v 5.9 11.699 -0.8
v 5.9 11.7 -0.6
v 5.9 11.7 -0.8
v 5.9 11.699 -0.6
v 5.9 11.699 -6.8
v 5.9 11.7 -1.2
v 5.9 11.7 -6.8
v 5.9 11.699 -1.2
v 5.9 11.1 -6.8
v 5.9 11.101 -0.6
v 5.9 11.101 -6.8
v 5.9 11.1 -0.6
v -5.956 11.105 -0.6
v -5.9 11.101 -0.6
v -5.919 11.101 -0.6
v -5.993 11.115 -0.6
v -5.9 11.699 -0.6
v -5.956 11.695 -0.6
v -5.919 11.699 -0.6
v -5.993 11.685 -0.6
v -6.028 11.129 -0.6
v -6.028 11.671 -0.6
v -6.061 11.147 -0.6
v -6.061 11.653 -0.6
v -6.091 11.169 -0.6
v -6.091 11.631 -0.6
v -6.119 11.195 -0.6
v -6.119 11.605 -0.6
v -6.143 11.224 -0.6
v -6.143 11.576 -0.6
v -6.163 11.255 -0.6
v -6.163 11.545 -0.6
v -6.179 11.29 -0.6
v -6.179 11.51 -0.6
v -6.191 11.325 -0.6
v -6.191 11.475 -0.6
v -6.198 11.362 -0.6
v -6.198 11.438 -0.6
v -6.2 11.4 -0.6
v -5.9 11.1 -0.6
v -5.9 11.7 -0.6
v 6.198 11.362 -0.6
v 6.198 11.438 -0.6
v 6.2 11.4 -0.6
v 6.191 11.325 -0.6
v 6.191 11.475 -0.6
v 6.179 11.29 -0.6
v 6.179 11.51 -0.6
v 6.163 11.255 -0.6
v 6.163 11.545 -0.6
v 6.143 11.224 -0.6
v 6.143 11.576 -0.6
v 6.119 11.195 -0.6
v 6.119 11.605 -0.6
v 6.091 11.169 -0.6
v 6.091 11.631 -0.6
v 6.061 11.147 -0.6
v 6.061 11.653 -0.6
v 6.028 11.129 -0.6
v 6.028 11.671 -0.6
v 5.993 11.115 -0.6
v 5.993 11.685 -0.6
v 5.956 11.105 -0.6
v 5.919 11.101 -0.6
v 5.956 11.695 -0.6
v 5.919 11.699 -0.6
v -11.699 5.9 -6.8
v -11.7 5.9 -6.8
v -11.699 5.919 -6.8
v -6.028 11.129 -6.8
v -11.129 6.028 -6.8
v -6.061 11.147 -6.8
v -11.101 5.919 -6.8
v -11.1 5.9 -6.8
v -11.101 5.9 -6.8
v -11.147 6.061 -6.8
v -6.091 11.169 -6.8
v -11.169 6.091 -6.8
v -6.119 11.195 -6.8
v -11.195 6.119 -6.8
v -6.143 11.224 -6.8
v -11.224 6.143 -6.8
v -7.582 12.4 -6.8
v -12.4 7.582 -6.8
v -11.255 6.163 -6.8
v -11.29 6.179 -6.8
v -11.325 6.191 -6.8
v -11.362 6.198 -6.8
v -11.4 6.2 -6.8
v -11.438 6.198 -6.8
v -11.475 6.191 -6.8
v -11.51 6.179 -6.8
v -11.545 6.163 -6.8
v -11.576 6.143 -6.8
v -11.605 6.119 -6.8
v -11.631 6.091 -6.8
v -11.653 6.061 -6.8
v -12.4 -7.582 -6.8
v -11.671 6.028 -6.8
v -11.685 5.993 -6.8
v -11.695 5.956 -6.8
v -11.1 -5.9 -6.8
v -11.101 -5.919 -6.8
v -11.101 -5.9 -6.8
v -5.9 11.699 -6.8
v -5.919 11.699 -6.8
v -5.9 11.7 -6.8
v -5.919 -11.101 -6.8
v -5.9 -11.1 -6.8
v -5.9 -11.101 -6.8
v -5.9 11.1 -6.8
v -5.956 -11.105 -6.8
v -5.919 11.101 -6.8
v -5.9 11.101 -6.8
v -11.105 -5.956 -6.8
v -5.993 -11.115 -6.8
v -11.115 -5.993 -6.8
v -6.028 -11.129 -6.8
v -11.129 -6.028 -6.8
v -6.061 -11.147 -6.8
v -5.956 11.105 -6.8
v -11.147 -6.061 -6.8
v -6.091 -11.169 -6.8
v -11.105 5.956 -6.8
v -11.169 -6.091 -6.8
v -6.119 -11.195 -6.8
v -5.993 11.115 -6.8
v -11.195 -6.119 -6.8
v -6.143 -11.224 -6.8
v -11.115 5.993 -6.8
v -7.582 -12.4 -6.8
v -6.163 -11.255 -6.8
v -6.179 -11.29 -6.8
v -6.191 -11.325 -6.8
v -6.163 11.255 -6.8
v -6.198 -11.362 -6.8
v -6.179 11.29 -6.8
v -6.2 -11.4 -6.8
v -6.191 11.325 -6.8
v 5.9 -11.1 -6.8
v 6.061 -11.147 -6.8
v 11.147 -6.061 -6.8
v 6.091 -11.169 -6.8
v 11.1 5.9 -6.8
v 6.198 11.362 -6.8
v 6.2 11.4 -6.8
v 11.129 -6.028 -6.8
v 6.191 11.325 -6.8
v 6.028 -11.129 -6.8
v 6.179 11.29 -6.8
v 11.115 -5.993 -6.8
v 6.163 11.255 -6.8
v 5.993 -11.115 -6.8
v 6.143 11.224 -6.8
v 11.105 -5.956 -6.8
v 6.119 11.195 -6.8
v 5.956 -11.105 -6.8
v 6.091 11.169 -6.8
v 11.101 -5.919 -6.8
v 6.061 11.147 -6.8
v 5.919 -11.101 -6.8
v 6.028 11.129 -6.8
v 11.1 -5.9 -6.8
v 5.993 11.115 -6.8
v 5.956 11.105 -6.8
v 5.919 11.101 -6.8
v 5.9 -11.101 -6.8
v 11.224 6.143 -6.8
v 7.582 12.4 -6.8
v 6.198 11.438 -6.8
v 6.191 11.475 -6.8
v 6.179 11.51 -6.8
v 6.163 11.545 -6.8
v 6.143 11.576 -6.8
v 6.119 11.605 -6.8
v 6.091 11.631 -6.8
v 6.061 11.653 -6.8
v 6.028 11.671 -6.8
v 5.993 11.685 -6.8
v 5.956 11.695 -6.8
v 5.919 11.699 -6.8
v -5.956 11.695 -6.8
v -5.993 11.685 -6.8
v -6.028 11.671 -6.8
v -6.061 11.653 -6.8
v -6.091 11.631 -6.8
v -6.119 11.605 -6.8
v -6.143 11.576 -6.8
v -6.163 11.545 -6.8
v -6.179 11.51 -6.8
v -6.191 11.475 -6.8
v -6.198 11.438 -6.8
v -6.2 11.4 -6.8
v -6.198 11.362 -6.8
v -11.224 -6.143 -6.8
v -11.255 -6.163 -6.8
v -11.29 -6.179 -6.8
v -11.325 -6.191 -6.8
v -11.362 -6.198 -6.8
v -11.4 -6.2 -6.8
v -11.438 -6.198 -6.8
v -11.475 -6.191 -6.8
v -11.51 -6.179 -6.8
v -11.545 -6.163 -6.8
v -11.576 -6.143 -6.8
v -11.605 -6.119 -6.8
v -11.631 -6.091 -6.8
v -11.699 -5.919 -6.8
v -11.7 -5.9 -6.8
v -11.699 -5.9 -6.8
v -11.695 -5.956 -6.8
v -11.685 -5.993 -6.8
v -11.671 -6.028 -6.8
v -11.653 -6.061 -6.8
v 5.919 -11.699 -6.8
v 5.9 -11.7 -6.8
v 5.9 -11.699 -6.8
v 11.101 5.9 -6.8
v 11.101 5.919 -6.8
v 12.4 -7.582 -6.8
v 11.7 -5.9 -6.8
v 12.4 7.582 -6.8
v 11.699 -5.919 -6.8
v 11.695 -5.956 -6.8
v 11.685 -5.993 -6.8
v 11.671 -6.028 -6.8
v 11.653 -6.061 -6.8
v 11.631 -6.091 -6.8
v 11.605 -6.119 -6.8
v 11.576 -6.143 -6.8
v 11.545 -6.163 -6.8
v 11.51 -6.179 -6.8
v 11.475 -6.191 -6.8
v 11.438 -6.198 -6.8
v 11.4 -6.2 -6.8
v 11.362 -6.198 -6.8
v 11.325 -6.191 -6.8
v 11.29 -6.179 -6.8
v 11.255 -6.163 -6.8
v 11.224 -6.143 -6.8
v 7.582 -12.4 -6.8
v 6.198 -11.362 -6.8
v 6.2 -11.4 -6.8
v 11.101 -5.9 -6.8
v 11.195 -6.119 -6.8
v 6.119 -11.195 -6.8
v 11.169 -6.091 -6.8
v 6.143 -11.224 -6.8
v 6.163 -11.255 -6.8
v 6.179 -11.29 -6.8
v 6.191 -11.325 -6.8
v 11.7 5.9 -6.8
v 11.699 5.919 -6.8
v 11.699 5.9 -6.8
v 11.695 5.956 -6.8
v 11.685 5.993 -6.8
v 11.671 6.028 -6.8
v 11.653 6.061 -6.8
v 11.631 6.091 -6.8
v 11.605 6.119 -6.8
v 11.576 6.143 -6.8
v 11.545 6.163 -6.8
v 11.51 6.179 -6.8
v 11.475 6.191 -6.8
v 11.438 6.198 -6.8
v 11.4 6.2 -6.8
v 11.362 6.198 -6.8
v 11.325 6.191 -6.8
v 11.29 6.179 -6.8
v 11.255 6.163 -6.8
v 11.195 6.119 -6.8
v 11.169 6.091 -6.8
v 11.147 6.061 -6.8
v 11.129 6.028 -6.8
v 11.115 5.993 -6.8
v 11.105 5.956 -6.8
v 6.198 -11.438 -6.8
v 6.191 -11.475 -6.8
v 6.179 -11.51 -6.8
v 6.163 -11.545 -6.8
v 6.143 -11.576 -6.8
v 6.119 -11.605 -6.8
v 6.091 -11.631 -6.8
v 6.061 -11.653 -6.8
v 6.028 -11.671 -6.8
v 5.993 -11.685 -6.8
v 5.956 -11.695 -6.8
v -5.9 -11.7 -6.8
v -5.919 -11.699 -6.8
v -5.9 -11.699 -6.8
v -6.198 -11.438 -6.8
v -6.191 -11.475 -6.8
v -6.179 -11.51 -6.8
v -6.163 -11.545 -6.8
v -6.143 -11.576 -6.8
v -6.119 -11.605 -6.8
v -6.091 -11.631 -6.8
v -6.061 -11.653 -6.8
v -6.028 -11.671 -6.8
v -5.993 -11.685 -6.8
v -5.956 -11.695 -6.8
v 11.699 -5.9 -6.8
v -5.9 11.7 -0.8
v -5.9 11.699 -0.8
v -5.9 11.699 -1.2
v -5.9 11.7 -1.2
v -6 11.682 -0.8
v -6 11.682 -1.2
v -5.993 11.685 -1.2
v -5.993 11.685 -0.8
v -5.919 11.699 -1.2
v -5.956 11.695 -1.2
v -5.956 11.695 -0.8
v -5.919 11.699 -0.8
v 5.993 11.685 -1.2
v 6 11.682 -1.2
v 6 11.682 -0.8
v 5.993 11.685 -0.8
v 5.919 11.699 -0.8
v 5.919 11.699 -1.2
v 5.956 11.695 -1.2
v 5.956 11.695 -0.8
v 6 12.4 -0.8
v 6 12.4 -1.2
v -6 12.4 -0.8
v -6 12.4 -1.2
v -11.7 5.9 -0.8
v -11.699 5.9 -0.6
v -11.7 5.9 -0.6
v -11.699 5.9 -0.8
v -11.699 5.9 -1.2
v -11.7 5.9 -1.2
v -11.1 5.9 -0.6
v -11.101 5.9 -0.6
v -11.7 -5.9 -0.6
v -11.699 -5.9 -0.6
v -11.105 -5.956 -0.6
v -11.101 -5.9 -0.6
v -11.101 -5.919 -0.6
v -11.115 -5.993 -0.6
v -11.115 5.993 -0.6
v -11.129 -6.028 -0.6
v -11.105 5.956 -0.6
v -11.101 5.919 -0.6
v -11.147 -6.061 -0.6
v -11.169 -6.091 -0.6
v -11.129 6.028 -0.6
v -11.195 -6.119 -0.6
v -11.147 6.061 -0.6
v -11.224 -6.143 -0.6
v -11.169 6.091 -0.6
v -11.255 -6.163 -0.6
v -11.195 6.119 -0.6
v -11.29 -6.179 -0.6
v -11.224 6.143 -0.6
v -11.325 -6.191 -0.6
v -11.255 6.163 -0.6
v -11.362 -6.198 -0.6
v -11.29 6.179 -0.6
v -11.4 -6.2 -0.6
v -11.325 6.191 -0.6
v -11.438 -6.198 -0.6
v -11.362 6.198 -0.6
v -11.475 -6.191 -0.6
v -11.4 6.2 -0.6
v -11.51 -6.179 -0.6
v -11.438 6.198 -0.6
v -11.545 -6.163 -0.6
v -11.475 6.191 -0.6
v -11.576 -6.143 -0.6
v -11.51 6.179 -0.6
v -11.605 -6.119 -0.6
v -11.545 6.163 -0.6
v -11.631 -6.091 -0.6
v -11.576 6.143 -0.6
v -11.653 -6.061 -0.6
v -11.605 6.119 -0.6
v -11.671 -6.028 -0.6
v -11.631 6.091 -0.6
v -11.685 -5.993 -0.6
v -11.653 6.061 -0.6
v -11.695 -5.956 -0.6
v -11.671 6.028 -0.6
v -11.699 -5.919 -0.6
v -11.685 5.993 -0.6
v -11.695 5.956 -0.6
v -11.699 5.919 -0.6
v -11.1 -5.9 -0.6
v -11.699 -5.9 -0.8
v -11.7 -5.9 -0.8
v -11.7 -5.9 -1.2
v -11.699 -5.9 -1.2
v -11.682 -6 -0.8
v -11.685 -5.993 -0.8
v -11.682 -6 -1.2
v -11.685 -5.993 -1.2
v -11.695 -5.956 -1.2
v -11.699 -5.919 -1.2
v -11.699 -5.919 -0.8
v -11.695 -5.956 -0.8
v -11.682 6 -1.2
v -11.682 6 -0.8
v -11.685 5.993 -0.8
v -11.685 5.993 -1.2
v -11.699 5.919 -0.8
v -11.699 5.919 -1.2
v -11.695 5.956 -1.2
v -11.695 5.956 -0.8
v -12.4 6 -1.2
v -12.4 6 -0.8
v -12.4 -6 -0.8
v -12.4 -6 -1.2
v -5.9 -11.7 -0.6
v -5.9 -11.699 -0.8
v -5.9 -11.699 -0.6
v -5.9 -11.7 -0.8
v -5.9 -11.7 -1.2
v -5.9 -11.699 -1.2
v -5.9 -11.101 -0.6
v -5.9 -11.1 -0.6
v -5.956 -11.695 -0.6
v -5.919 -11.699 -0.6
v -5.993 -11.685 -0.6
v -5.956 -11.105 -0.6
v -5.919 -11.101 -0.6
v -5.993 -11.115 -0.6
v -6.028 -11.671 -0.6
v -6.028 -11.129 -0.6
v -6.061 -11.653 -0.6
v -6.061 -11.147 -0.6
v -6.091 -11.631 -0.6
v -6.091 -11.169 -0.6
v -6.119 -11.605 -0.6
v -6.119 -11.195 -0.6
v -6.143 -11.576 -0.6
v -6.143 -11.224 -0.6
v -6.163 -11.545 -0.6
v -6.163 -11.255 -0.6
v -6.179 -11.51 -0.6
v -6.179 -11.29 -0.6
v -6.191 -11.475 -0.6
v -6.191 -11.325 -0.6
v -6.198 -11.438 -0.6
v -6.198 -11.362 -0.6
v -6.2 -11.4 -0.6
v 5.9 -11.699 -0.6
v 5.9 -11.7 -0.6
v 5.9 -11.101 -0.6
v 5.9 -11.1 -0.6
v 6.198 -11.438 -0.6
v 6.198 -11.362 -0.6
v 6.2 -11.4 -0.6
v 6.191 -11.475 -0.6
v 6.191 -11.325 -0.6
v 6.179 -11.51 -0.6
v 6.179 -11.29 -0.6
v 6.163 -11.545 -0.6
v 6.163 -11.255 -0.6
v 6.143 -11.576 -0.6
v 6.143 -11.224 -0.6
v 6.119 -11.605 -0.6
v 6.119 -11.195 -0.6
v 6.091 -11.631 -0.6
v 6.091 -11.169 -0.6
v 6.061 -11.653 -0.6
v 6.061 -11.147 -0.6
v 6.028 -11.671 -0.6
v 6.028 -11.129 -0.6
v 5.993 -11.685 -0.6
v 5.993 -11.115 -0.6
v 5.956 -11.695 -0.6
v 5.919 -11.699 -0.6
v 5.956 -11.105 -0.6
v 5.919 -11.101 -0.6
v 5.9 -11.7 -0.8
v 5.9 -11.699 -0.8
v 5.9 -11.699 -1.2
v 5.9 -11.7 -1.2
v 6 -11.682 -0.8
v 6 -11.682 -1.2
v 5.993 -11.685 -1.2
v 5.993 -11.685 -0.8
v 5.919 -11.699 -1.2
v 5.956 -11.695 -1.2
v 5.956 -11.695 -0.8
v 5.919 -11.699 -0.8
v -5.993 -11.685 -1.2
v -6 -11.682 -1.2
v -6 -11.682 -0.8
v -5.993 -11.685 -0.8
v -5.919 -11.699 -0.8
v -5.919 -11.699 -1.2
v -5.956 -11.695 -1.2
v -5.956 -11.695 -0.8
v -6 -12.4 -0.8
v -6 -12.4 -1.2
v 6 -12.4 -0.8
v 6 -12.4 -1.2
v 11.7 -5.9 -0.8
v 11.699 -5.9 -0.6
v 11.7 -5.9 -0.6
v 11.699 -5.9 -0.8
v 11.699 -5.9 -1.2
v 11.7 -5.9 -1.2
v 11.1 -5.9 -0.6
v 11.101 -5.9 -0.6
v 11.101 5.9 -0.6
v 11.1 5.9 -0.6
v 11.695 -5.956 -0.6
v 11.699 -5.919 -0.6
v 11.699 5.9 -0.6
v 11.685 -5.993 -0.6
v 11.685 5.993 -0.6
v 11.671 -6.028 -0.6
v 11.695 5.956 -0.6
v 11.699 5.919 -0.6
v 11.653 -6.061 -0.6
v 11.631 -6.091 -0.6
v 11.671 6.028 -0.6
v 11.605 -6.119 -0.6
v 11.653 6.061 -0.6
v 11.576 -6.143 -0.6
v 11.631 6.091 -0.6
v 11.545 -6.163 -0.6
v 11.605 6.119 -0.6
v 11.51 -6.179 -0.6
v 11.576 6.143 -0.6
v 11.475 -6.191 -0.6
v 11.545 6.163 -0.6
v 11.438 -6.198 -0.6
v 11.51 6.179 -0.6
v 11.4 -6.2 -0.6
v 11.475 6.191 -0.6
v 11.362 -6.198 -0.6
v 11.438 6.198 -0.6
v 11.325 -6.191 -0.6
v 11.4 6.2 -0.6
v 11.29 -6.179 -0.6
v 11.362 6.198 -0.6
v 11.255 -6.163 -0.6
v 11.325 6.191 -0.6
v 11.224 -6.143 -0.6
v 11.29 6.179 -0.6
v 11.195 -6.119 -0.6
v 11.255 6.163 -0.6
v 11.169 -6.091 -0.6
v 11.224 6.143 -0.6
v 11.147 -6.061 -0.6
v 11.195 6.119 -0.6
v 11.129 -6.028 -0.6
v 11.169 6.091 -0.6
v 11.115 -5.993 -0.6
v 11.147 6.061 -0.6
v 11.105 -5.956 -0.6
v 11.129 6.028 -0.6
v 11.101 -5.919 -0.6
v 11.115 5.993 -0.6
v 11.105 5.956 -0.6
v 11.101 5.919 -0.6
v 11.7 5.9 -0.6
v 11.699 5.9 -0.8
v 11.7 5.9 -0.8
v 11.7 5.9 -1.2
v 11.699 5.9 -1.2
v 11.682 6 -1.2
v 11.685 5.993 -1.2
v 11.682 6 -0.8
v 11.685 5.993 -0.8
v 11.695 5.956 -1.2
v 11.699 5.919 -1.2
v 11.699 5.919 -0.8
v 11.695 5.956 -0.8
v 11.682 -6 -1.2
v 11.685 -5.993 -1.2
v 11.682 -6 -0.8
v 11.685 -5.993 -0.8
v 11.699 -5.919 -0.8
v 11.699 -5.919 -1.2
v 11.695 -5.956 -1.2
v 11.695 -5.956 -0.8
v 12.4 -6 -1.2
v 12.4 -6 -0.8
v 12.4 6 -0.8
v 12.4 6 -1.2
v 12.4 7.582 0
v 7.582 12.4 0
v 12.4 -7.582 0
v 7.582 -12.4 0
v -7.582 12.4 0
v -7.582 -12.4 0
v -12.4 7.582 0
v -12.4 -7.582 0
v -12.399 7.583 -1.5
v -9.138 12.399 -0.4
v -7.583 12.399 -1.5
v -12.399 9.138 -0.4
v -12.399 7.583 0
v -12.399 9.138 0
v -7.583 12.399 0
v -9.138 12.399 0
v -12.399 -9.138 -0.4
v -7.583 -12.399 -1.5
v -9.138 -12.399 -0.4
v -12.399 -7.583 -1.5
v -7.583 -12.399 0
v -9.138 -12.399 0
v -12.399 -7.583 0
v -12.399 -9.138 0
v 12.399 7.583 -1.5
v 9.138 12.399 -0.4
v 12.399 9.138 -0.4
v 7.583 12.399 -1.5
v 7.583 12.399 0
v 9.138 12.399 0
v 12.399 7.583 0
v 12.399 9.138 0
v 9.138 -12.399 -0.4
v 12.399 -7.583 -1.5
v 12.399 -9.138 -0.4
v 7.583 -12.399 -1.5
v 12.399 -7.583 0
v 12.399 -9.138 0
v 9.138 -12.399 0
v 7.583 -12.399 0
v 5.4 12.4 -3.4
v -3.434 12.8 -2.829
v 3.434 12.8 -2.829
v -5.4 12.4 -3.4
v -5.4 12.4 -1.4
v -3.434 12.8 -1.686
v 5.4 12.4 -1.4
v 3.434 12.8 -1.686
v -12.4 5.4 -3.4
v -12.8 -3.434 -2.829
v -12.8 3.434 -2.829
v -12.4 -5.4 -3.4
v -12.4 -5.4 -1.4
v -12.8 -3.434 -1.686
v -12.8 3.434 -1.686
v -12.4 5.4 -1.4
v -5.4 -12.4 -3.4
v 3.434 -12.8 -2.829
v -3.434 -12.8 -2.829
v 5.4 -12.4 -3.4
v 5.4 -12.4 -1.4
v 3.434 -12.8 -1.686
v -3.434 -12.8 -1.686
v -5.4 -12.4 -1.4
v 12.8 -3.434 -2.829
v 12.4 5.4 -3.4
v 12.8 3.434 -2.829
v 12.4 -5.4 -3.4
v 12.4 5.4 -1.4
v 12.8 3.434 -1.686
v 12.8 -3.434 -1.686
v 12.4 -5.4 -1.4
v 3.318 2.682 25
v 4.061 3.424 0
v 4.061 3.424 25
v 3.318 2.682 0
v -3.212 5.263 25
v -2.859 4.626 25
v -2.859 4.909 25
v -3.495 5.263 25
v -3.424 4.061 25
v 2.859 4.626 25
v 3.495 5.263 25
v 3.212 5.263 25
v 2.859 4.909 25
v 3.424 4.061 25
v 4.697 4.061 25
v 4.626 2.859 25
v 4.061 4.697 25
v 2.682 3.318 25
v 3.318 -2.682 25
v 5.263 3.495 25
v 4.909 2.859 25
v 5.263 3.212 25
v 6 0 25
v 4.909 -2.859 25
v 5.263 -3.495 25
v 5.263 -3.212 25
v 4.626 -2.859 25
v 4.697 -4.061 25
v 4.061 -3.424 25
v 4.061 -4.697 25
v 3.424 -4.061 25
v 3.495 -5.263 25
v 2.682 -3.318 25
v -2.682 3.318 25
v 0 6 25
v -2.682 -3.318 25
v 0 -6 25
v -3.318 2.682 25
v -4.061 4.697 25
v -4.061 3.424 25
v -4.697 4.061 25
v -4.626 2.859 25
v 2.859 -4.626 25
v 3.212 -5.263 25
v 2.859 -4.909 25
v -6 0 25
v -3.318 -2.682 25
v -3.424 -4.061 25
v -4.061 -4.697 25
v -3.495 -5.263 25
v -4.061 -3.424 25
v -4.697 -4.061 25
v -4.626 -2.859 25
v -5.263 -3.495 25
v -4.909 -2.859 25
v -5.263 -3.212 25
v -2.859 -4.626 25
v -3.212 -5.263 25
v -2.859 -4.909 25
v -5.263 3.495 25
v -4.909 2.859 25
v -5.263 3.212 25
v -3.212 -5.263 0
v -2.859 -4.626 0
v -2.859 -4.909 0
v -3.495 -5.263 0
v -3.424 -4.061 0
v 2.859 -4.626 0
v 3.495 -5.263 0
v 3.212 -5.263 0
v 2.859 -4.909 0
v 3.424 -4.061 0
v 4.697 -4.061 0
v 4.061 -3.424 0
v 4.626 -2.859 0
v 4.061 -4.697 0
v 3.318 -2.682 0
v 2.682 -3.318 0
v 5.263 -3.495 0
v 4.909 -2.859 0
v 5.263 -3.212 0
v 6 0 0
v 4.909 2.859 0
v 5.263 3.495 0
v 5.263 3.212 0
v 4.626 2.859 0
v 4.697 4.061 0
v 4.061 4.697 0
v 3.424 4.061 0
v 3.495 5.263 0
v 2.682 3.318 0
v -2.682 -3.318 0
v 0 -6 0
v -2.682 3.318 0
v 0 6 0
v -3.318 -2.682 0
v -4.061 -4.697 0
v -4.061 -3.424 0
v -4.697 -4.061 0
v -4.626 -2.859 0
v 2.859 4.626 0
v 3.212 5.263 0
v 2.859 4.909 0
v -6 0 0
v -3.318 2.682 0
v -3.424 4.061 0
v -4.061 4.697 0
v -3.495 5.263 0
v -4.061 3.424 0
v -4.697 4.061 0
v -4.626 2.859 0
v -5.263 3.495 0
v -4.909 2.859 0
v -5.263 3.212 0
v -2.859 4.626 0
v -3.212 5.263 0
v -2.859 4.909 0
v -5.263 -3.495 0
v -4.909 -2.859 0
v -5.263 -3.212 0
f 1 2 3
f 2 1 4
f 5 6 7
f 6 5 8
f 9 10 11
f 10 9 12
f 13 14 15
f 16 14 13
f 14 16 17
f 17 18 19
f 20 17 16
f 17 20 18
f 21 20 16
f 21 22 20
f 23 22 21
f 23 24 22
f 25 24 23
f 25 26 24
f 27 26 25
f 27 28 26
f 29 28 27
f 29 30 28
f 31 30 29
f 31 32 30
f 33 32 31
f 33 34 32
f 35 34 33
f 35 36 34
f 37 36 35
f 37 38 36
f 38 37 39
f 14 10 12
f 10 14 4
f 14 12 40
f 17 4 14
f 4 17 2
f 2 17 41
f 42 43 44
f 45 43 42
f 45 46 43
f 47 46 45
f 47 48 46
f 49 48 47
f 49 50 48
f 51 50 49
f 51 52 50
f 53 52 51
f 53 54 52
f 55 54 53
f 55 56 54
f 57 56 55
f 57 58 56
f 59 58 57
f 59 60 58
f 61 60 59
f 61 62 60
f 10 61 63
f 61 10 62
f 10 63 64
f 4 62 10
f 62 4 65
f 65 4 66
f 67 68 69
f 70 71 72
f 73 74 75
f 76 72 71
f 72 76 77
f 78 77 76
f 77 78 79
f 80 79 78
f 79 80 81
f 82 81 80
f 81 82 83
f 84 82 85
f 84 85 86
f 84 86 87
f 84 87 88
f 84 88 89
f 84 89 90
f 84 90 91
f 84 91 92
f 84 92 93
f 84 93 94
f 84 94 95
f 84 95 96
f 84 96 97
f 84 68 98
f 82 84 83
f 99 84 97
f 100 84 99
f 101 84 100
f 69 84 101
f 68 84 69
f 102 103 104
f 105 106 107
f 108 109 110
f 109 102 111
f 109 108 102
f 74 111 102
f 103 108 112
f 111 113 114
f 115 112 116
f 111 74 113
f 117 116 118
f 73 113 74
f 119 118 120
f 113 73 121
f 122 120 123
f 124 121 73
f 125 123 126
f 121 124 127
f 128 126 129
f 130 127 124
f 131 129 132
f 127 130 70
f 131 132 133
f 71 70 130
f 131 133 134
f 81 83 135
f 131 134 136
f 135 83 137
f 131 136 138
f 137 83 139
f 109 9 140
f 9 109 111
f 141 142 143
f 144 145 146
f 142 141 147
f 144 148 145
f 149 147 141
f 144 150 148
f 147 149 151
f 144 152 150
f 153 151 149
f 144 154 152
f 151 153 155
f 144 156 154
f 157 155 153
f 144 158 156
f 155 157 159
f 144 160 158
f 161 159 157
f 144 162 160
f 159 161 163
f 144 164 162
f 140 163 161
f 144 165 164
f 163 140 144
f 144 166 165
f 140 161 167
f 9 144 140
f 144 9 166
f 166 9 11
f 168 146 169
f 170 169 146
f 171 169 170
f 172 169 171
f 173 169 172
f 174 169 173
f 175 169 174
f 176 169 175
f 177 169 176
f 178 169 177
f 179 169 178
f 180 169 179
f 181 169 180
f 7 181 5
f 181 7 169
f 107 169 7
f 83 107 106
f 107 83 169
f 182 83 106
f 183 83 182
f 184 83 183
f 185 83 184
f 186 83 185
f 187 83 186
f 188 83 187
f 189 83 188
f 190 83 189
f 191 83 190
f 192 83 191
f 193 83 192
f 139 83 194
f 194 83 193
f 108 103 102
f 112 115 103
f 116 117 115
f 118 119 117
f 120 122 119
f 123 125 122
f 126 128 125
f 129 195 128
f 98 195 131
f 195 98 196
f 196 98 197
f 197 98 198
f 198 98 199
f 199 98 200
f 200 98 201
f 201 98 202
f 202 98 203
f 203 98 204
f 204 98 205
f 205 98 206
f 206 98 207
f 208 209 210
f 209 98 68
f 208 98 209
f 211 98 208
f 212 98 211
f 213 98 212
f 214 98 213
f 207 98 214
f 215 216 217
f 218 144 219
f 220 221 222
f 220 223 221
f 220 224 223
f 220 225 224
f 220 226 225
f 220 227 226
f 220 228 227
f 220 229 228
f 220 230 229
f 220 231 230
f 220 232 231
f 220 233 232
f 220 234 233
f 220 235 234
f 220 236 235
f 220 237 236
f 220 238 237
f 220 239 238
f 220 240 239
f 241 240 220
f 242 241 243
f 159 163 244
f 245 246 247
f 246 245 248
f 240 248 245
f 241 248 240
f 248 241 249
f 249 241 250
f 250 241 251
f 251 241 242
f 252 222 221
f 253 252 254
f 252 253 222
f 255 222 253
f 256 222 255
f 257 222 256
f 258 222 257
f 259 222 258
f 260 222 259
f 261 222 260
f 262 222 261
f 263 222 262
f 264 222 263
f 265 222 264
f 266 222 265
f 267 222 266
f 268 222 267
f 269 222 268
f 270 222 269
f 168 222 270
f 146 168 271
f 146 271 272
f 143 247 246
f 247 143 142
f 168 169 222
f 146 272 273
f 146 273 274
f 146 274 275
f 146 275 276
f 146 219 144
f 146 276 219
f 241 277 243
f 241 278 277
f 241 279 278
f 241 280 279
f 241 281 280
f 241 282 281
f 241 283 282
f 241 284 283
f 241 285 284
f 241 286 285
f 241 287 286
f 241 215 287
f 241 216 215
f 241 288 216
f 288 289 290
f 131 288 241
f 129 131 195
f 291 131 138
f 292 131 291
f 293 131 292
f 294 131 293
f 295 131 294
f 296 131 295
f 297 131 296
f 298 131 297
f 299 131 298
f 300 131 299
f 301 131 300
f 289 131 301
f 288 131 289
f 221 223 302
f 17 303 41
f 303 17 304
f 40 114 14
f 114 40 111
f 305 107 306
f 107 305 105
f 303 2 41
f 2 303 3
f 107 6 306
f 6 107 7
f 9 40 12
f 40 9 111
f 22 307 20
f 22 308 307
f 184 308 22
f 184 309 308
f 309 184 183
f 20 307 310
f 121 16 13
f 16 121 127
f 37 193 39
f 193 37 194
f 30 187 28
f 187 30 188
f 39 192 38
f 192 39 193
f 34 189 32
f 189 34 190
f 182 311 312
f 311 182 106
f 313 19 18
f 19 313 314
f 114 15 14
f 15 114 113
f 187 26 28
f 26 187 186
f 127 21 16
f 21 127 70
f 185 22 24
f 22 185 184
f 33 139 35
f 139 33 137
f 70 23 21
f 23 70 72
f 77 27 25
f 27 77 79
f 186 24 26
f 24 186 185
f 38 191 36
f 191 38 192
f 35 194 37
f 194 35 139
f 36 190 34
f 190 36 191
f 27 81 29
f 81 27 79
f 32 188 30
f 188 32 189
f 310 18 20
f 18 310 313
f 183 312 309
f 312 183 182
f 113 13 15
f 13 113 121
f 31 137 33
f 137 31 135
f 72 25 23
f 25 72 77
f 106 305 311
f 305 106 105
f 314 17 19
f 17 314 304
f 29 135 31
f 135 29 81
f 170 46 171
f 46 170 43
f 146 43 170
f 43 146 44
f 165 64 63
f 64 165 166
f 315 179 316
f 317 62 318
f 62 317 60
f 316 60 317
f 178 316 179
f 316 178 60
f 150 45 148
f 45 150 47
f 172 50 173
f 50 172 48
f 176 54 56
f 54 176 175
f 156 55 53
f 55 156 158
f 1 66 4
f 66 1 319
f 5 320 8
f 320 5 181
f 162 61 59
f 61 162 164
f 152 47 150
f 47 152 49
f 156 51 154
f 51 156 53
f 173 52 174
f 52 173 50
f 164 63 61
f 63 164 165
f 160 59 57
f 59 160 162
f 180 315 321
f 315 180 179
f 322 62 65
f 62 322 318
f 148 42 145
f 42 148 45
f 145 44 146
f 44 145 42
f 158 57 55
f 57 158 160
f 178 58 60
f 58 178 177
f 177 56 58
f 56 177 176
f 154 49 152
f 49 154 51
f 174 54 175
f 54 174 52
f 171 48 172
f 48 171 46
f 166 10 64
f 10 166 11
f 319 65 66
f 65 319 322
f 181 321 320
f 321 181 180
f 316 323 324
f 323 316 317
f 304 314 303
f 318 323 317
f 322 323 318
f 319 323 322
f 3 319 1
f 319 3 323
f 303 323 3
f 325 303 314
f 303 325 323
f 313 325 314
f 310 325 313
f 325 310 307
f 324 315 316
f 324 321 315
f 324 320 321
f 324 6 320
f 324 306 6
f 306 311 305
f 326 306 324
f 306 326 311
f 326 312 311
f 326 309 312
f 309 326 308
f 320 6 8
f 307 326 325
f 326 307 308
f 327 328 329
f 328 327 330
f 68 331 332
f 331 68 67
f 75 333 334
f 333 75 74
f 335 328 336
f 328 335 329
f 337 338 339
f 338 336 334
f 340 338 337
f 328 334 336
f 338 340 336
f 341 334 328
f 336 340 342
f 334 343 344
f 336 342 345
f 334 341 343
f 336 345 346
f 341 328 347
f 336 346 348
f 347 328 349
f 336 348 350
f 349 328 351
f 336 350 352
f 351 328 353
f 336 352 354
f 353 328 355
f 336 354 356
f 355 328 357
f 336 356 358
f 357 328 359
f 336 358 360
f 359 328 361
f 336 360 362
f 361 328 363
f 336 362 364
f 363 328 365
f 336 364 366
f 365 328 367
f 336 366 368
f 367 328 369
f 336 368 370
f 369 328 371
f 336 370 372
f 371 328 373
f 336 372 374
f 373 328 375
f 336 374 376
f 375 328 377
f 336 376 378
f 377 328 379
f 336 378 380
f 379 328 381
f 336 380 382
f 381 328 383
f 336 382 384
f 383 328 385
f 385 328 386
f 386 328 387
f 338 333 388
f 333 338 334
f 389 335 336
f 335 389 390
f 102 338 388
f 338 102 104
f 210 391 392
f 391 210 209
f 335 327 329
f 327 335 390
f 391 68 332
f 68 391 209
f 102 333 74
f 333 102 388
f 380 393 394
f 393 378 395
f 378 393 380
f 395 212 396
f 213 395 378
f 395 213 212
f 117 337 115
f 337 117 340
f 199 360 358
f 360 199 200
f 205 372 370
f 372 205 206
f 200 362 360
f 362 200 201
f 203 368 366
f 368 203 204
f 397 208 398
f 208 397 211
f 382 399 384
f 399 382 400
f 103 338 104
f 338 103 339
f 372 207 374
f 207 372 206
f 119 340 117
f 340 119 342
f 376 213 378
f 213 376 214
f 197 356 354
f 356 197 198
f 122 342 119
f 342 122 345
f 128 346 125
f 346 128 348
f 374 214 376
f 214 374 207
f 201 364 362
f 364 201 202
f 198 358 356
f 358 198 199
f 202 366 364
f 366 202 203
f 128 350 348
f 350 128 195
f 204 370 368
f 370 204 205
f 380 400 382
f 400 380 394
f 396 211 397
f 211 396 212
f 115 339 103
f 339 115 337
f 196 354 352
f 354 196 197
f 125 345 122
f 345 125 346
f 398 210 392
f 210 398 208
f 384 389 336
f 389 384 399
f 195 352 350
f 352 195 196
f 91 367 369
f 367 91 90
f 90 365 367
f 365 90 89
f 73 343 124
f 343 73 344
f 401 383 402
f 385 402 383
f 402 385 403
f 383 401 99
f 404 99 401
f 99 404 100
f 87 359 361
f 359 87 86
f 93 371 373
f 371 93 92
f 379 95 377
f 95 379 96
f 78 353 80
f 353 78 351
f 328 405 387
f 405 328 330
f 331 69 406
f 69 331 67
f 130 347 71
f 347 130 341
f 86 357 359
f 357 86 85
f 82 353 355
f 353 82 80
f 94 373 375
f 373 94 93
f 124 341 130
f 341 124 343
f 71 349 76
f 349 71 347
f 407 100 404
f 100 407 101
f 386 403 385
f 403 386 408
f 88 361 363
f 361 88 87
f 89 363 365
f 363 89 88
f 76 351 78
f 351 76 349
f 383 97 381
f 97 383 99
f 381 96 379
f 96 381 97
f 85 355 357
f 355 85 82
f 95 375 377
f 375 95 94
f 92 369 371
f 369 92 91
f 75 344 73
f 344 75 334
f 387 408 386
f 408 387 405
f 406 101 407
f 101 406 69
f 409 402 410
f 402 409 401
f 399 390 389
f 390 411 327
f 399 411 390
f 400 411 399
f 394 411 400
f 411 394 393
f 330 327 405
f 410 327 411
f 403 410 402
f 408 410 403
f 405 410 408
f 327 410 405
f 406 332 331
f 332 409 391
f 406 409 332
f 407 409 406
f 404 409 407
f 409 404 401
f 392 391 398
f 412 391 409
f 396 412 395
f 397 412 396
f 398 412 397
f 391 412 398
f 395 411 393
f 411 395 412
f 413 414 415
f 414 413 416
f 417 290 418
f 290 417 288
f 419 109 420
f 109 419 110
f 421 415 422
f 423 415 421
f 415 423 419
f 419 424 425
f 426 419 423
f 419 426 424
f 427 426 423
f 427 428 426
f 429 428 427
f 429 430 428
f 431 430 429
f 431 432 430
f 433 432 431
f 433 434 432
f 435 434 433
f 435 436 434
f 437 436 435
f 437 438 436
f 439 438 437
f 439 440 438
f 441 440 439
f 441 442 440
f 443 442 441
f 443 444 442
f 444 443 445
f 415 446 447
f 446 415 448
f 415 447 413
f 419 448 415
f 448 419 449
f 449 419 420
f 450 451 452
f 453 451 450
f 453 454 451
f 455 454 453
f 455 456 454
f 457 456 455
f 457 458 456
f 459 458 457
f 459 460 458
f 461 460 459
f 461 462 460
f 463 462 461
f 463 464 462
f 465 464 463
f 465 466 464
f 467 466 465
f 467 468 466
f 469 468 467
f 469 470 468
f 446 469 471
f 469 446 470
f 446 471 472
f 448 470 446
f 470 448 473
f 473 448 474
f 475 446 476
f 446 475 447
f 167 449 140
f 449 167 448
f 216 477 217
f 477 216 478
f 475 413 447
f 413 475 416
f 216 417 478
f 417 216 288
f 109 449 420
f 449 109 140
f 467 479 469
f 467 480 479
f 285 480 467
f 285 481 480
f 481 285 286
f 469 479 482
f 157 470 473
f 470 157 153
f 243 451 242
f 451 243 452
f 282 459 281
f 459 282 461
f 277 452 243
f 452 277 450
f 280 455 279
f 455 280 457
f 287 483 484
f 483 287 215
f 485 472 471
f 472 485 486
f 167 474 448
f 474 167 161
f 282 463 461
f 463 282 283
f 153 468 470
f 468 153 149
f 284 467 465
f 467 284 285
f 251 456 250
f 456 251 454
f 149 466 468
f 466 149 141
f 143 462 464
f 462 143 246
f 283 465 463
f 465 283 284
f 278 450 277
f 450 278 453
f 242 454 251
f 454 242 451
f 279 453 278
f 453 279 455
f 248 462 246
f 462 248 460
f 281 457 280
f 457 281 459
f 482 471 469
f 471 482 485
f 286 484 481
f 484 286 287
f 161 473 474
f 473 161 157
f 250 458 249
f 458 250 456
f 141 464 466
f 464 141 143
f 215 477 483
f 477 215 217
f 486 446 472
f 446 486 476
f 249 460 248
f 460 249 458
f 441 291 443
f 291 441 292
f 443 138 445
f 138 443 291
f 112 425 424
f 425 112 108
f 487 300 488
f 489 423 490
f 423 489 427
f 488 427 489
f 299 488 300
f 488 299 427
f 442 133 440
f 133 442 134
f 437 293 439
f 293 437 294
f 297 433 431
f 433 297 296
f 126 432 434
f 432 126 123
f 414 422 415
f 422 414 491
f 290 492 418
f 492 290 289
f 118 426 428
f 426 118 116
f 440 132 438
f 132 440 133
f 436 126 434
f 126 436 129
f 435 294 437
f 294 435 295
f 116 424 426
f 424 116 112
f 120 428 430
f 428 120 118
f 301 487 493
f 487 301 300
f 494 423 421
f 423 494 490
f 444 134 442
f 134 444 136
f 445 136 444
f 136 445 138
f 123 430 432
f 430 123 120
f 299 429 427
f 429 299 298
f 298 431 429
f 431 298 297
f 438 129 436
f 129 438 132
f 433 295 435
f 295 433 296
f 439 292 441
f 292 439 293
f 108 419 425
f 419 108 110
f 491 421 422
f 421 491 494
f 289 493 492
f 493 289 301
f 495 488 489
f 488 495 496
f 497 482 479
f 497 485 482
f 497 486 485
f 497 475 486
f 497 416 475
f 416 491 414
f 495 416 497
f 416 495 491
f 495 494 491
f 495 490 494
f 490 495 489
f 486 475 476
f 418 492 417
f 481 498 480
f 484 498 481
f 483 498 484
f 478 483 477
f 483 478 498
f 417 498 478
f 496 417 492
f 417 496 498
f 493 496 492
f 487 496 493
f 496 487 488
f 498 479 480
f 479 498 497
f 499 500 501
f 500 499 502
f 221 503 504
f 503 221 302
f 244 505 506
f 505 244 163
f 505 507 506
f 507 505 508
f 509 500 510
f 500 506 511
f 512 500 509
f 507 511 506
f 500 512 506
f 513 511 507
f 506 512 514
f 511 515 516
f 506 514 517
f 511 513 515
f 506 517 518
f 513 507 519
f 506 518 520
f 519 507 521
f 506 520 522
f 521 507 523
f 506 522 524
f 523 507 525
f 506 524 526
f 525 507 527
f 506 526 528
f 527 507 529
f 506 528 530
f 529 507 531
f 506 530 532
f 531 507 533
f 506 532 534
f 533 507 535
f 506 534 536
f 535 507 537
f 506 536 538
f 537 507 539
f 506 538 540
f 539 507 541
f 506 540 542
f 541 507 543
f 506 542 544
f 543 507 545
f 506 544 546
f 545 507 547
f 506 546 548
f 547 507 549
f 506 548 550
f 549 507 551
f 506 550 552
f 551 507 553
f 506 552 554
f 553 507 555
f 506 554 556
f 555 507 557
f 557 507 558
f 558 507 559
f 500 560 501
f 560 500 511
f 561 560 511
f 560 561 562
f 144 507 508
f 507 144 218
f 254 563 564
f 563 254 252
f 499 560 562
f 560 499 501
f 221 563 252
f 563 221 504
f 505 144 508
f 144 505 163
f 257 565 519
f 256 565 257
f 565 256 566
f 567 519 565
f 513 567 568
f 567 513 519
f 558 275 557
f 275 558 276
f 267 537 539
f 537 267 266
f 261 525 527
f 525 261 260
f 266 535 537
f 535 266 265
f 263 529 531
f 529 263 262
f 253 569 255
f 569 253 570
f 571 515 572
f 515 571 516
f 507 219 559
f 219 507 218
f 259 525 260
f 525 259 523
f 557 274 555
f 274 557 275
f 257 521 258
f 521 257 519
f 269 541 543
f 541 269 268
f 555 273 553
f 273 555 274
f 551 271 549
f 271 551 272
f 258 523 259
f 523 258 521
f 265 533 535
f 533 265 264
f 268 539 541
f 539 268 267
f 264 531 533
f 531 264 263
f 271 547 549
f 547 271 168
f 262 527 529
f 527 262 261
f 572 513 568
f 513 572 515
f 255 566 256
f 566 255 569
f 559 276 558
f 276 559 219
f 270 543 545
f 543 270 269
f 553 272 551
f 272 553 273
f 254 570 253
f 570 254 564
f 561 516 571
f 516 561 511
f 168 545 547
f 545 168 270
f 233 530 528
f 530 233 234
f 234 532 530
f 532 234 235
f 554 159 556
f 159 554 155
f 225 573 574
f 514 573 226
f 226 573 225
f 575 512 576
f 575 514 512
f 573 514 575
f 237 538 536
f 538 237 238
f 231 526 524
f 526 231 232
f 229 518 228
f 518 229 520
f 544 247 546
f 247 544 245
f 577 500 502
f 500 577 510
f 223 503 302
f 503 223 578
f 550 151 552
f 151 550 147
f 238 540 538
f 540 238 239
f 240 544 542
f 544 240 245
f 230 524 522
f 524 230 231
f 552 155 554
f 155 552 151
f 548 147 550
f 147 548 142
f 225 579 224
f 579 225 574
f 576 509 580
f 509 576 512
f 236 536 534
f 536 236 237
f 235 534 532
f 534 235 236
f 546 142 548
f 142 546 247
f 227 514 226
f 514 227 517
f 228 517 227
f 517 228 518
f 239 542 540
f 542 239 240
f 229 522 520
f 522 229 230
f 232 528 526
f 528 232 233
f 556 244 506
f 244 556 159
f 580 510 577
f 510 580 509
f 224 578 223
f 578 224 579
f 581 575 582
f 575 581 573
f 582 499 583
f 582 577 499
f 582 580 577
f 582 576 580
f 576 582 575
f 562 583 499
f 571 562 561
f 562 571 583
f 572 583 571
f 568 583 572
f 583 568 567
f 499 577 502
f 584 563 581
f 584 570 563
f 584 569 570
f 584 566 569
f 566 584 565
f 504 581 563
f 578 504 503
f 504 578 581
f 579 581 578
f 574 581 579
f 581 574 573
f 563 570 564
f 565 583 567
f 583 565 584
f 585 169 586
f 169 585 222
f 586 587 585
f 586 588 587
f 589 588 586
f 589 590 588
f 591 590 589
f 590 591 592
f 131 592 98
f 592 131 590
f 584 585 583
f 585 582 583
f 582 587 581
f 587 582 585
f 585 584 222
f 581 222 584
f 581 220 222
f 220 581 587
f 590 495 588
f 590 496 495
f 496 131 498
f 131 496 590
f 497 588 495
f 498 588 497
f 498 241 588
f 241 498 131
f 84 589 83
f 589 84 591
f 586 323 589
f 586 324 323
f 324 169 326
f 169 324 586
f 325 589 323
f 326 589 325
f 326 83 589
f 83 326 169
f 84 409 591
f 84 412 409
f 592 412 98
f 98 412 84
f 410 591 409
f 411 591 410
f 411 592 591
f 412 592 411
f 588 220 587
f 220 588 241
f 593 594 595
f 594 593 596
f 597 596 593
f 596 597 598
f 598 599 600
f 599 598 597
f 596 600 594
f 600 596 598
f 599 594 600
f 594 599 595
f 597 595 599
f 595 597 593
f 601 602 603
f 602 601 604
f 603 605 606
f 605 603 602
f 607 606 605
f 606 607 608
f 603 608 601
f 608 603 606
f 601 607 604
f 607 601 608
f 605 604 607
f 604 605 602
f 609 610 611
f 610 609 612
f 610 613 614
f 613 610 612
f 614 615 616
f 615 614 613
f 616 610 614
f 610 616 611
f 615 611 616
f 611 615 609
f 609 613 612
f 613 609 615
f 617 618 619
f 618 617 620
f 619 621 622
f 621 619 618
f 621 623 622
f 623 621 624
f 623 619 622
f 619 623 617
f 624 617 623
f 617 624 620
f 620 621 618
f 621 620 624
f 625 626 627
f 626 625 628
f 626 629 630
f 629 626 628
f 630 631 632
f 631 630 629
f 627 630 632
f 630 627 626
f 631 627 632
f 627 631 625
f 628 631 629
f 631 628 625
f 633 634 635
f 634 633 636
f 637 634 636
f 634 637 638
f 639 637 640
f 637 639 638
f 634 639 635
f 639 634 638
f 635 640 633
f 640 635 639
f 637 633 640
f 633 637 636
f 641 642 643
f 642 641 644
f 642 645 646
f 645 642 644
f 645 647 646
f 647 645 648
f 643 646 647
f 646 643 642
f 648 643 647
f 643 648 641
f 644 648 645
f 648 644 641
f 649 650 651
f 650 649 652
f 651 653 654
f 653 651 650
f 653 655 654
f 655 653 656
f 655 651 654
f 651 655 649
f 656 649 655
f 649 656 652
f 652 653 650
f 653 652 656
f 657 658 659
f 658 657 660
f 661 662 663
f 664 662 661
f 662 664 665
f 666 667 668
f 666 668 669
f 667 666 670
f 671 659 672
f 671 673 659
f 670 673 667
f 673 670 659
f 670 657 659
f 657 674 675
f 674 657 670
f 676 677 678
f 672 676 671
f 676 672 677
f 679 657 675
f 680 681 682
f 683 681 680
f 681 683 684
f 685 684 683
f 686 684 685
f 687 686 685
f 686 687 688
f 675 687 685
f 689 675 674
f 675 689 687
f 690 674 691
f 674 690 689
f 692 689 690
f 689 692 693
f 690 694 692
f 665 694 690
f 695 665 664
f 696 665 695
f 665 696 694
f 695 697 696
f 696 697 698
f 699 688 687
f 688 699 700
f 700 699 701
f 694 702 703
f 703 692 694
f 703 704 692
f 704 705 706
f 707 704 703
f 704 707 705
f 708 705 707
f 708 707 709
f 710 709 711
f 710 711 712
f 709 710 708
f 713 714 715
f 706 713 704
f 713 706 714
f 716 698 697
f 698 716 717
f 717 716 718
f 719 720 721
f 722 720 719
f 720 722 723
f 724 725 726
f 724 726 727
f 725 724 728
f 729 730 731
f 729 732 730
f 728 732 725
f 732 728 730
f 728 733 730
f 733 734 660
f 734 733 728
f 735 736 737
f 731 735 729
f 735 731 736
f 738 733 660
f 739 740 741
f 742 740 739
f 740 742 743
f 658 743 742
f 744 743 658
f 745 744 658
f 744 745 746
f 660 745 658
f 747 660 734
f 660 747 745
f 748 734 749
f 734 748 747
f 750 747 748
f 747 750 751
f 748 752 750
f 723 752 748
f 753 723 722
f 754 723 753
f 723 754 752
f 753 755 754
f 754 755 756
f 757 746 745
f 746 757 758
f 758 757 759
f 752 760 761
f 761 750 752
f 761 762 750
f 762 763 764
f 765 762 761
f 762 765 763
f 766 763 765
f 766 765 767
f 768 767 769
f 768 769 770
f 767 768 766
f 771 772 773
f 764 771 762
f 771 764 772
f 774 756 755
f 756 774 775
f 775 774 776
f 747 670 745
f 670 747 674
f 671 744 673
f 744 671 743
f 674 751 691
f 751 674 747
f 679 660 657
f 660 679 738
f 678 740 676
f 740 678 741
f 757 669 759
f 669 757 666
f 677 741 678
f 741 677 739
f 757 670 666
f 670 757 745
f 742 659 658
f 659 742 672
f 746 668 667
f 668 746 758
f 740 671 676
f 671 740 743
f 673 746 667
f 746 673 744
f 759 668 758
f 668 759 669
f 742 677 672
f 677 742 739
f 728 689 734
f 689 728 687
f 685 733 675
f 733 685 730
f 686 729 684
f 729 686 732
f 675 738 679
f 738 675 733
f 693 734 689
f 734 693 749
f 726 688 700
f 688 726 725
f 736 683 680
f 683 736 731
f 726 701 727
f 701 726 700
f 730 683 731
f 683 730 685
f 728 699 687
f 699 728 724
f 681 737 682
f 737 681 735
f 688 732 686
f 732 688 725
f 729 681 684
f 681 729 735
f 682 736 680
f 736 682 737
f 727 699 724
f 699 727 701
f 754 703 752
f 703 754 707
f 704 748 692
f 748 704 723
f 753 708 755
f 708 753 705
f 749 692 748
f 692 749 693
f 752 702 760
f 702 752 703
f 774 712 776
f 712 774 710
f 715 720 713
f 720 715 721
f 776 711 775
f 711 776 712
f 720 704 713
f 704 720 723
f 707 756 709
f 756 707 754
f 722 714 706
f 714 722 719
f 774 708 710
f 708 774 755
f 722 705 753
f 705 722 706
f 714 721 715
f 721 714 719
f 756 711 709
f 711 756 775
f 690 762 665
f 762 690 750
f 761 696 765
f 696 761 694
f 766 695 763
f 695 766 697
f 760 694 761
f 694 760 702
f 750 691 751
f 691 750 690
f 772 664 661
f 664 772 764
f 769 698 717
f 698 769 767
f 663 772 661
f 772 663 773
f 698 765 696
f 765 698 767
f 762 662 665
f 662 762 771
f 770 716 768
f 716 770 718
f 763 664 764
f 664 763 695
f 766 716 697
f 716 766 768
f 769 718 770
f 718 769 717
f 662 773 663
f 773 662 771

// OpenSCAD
opengrid_snap = true;
connector_offset = 0.05;
corner_1 = true;
corner_2 = true;
corner_3 = true;
corner_4 = true;
corner_1_depth = 25;
corner_2_depth = 25;
corner_3_depth = 25;
corner_4_depth = 25;
connector_fillet = 0.2;

module openGridSnap () {
    $fn =50;
    module cutout() {
        union() {
            translate([0, 11.4, 3.1])
                cube([11.8, 0.6, 6.2], true);
            translate([-5.9, 11.4, 3.1])
                cylinder(6.2, 0.3, 0.3, true);
            translate([5.9, 11.4, 3.1])
                cylinder(6.2, 0.3, 0.3, true);
            translate([0, 12, 5.8])
                cube([12, 0.8, 0.4], true);
        }
    }
    
    module corner() {
        translate([0, 0, 5.3])
            polyhedron(
                [
                    [-3.406, 0, 0],
                    [-2.306, 1.1, 1.1],
                    [2.306, 1.1, 1.1],
                    [3.406, 0, 0],
                    [-3.406, 0, 1.5],
                    [-2.306, 1.1, 1.5],
                    [2.306, 1.1, 1.5],
                    [3.406, 0, 1.5]
                ], 
                [
                    [0,1,2,3],
                    [4,5,1,0],
                    [7,6,5,4],
                    [5,6,2,1],
                    [6,7,3,2],
                    [7,4,0,3]
                ]
            );
    }
    
    module snap() {
        translate([0, 12.4, 3.4])
            polyhedron(
                [
                    [-5.4, 0, 0],
                    [-3.4342, 0.4, 0.5715],
                    [3.4342, 0.4, 0.5715],
                    [5.4, 0, 0],
                    [-5.4, 0, 2],
                    [-3.4342, 0.4, 1.7145],
                    [3.4342, 0.4, 1.7145],
                    [5.4, 0, 2]
                ], 
                [
                    [0,1,2,3],
                    [4,5,1,0],
                    [7,6,5,4],
                    [5,6,2,1],
                    [6,7,3,2],
                    [7,4,0,3]
                ]
            );
    }
    
    union() {
        difference() {
            linear_extrude(6.8) {
                polygon(
                    [
                        [-7.582, -12.4],
                        [7.582, -12.4],
                        [12.4, -7.582],
                        [12.4, 7.582],
                        [7.582, 12.4],
                        [-7.582, 12.4],
                        [-12.4, 7.582],
                        [-12.4, -7.582]
                    ]
                );
            }
            
            cutout();
            rotate([0, 0, 90]) cutout();
            rotate([0, 0, 180]) cutout();
            rotate([0, 0, -90]) cutout();
        }
        
        translate([-9.991, 9.991, 0]) rotate([0, 0, 45]) corner();
        translate([-9.991, -9.991, 0]) rotate([0, 0, 135]) corner();
        translate([9.991, 9.991, 0]) rotate([0, 0, -45]) corner();
        translate([9.991, -9.991, 0]) rotate([0, 0, -135]) corner();
        
        snap();
        rotate([0, 0, 90]) snap();
        rotate([0, 0, 180]) snap();
        rotate([0, 0, -90]) snap();
    }
}

module connector(connector_depth) {
    linear_extrude(connector_depth) {
        polygon(points = [[0,0], [6,0], [0,6]]);
    }
    translate([3, 3, 0])
        rotate([0, 0, -45])
        union() {
            translate([-0.5 + connector_offset, 0, 0])
                cube([1 - (connector_offset * 2), 2 - connector_offset, connector_depth]);
            linear_extrude(connector_depth) {
                translate([-1.5 + connector_offset + connector_fillet, 1 + connector_offset + connector_fillet, 0])
                    offset(connector_fillet) {
                        square([3 - (connector_offset * 2) - (connector_fillet * 2), 1 - (connector_offset * 2) - (connector_fillet * 2)]);
                    }
            }
        }
}

union() {
    if (opengrid_snap) {
        translate([0, 0, -6.80])
            openGridSnap();
    }

    if (corner_1) {
        connector(corner_1_depth);
    }
    if (corner_2) {
        rotate([0, 0, -90])
            connector(corner_2_depth);
    }
    if (corner_3) {
        rotate([0, 0, 180])
            connector(corner_3_depth);
    }
    if (corner_4) {
        rotate([0, 0, 90])
            connector(corner_4_depth);
    }
}
